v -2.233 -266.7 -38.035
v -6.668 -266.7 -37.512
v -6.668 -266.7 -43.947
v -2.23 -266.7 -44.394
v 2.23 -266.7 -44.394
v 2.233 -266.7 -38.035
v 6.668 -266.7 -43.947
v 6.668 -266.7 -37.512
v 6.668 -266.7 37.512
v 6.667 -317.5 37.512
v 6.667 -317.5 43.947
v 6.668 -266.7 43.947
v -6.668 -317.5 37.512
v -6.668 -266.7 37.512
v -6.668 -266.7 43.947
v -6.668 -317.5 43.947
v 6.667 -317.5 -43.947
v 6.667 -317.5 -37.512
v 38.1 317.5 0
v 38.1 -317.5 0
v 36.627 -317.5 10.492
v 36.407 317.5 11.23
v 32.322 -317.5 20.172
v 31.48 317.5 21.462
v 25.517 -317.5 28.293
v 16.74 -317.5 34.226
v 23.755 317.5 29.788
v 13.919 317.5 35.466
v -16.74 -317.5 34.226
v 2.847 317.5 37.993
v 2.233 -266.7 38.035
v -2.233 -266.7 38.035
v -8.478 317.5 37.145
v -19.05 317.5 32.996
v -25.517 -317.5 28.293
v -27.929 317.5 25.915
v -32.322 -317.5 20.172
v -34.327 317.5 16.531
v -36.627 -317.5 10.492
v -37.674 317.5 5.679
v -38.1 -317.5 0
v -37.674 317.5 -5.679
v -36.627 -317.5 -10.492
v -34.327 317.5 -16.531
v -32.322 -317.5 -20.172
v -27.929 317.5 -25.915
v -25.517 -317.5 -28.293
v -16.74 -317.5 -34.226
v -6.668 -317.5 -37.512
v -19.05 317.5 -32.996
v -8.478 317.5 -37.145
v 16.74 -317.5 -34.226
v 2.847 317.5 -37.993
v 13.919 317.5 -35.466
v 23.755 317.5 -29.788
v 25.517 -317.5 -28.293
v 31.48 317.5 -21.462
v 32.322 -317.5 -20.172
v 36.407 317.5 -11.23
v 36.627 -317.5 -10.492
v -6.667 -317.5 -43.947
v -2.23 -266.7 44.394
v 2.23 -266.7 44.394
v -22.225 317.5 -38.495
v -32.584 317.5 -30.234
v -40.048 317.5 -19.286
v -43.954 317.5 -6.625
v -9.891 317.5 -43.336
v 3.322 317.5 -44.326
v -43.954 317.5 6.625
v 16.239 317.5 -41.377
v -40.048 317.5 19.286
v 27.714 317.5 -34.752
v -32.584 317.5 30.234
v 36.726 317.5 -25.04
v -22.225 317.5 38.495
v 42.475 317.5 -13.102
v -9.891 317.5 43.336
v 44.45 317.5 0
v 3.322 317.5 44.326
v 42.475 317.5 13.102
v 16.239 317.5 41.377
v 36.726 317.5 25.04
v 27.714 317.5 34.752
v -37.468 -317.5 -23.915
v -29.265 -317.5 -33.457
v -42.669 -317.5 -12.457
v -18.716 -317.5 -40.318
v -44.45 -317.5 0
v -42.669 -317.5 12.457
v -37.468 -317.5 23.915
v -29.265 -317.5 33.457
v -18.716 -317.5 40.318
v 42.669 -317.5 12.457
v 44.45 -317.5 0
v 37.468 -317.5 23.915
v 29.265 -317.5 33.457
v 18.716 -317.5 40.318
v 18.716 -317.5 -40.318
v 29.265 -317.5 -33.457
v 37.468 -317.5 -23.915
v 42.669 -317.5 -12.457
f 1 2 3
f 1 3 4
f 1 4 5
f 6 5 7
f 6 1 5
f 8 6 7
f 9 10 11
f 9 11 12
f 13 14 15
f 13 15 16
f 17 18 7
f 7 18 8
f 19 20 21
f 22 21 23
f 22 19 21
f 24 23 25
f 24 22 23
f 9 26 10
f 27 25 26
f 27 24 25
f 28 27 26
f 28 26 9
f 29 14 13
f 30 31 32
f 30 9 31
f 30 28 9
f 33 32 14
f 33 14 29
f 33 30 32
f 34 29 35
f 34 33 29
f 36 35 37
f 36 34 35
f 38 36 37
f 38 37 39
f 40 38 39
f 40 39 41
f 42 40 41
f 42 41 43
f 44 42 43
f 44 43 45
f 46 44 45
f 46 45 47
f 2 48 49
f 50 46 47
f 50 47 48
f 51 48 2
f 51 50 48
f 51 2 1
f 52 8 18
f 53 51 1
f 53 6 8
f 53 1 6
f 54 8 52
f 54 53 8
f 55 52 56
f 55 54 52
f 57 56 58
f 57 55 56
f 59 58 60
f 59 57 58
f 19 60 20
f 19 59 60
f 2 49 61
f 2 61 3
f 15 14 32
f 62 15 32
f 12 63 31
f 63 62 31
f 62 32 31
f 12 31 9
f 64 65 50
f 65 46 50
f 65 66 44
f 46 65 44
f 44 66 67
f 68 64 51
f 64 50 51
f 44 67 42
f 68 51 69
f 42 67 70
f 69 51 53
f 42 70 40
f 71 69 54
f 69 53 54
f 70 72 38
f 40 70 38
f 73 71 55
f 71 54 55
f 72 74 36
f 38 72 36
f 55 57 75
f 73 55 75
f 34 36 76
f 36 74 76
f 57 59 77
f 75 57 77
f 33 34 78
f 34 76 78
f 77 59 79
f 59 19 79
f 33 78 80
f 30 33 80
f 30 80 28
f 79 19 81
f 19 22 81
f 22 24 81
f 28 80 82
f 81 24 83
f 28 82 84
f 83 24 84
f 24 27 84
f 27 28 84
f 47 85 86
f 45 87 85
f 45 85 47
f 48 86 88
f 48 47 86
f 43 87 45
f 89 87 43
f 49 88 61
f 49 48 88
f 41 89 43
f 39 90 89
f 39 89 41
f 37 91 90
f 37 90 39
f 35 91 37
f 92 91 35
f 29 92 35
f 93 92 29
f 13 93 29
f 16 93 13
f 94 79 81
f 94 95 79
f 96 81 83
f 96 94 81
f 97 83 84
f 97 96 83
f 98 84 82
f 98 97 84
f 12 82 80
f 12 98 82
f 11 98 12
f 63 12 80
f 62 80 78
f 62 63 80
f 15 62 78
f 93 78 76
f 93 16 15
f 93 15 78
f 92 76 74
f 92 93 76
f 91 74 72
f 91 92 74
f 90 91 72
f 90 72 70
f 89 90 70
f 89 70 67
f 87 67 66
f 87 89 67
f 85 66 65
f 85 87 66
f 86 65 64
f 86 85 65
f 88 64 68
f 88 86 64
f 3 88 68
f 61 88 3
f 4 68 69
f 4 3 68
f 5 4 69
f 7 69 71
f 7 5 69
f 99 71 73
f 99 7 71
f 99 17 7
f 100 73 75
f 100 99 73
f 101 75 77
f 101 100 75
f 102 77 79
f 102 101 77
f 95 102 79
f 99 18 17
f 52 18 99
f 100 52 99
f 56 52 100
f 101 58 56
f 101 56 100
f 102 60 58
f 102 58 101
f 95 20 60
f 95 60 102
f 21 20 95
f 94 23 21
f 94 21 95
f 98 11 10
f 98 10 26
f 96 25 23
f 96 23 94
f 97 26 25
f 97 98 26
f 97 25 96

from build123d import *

# Parameters (mm, degrees)
F0_R     = 44.45
F0_R_2   = 38.1
F1_DEPTH = 317.5
F2_W     = 13.335
F2_H     = 50.8
F3_DEPTH = 44.451
F4_DEPTH = 44.451


with BuildPart() as f1:
    # F0 (on Front) → F1 (new body, symmetric)
    with BuildSketch(Plane.XZ):
        Circle(F0_R)
        Circle(F0_R_2, mode=Mode.SUBTRACT)
    extrude(amount=F1_DEPTH, both=True)

    # F2 (on Top) → F3 (cut, through all)
    with BuildSketch(Plane.XY):
        with Locations((0, -342.9)):
            Rectangle(F2_W, F2_H)
        with Locations((0, -292.1)):
            Rectangle(F2_W, F2_H)
    extrude(amount=F3_DEPTH, mode=Mode.SUBTRACT)

    # F2 (on Top) → F4 (cut, through all)
    with BuildSketch(Plane.XY):
        with Locations((0, -292.1)):
            Rectangle(F2_W, F2_H)
    extrude(amount=-F4_DEPTH, mode=Mode.SUBTRACT)


solid = f1.part
